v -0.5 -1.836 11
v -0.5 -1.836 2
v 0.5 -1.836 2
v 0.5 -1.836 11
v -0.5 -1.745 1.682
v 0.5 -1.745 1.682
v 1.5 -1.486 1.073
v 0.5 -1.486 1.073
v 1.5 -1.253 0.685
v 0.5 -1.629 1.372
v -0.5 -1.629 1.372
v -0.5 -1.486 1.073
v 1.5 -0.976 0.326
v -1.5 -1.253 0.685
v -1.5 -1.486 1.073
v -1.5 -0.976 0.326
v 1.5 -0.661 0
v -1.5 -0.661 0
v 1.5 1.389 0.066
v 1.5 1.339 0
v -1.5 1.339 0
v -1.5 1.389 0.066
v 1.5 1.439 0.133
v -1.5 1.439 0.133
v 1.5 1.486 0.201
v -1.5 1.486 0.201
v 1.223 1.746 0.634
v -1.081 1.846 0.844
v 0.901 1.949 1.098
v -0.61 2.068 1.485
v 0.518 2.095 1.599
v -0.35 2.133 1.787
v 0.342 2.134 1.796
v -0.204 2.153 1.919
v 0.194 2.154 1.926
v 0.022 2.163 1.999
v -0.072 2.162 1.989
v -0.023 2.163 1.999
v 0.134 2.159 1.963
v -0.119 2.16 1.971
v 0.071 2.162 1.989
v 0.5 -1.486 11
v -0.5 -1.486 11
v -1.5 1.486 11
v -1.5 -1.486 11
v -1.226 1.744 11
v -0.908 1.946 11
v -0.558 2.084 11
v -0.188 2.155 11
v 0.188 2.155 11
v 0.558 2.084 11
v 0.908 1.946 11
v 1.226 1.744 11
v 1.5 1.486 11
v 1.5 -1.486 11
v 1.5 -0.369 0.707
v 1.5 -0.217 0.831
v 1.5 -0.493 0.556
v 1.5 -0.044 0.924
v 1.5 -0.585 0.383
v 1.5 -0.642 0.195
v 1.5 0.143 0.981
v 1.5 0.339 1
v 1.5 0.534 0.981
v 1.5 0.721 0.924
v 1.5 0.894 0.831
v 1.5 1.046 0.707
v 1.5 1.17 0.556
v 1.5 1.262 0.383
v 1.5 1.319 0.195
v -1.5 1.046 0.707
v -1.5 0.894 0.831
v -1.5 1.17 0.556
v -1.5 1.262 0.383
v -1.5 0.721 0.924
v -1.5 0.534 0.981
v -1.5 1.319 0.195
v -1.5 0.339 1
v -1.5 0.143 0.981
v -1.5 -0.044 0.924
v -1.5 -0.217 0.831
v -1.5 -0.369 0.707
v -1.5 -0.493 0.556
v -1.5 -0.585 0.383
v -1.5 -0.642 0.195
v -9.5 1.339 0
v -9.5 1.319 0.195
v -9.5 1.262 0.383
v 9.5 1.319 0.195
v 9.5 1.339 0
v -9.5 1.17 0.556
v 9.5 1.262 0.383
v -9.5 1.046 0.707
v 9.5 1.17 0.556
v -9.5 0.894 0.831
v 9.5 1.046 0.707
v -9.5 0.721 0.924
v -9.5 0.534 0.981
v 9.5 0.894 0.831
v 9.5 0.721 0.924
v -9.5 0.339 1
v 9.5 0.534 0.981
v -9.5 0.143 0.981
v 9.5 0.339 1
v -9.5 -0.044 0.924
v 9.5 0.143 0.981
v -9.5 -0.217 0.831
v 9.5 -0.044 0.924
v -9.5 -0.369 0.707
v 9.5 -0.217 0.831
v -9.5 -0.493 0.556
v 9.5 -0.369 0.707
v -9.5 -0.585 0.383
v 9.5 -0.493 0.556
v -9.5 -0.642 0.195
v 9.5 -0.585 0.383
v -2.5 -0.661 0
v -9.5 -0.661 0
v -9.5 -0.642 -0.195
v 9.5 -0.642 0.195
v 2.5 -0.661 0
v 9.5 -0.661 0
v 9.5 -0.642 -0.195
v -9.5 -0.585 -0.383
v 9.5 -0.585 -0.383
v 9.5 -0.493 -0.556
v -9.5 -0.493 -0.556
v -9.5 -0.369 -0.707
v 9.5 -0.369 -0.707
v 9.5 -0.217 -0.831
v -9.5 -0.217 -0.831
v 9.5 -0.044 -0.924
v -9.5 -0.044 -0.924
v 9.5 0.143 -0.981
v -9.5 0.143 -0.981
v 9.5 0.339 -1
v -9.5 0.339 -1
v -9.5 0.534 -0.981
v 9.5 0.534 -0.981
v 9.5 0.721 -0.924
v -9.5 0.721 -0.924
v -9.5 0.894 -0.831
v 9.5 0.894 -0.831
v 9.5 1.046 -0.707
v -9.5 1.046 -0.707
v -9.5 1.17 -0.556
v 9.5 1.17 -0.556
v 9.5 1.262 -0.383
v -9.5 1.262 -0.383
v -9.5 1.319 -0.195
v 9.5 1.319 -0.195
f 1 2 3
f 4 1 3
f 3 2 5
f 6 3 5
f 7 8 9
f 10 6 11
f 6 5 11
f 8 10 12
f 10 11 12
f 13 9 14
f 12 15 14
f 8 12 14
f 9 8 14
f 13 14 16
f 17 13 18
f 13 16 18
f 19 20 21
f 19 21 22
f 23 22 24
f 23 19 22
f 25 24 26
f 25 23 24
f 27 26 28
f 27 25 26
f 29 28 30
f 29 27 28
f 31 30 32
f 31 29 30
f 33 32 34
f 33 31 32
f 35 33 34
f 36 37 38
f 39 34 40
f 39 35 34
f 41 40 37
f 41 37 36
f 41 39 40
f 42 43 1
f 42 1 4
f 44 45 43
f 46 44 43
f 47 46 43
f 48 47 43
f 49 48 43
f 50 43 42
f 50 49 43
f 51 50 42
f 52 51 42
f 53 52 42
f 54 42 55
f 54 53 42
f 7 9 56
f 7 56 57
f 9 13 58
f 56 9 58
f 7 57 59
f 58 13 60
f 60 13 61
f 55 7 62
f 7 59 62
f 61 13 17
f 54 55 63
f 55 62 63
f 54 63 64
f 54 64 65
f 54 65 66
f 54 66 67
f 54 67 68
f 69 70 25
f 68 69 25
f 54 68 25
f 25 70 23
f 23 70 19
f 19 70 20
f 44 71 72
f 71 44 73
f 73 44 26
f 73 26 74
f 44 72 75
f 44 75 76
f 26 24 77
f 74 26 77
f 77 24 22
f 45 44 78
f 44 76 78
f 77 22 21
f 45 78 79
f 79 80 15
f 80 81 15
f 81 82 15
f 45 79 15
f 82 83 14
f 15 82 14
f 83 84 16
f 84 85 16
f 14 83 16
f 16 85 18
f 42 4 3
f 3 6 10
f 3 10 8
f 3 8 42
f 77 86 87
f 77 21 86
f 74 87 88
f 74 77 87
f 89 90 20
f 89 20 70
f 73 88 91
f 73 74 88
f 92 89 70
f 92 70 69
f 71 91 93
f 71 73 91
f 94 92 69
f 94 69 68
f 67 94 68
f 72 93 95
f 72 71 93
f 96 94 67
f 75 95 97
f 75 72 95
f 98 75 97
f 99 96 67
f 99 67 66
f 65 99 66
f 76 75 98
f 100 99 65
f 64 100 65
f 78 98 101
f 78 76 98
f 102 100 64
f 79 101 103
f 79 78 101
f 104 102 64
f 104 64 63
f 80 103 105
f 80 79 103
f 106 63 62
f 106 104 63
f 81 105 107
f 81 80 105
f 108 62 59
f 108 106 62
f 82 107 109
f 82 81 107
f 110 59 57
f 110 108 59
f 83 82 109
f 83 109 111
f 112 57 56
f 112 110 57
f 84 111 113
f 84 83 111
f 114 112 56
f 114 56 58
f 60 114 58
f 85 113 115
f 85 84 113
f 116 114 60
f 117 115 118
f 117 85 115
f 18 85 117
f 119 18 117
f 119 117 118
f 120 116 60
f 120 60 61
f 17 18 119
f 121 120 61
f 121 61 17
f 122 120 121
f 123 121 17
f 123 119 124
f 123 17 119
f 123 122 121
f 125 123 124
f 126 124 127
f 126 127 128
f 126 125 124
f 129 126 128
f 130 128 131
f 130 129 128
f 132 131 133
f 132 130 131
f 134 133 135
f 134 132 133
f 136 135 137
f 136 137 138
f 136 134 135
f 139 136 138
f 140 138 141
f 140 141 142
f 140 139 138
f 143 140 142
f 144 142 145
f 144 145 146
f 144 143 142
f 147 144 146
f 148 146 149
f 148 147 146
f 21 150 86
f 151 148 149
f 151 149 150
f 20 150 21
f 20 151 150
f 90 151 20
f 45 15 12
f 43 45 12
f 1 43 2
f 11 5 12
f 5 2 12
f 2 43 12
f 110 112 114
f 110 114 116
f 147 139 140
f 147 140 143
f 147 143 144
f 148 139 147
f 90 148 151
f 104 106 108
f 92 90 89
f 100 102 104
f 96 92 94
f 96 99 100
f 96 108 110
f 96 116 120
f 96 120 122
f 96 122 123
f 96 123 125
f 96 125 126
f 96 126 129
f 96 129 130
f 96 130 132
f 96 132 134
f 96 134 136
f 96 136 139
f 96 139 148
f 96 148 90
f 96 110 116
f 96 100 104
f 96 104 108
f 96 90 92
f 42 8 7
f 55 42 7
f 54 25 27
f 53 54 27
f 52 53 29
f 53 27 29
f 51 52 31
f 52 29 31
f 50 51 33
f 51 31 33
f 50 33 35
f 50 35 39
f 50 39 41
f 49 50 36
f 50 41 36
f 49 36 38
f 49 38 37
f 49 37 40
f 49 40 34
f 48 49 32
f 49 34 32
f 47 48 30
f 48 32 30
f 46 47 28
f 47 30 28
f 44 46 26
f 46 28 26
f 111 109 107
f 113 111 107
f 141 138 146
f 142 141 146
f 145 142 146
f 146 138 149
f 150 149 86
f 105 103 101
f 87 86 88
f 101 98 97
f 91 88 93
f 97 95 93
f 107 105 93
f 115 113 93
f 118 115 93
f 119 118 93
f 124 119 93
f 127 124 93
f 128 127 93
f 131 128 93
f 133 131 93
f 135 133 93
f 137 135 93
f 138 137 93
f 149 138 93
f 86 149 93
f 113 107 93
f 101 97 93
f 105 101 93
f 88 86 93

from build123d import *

# Parameters (mm, degrees)
PAD_DEPTH    = 11
SKETCH001_R  = 1
PAD001_DEPTH = 9.5
POCKET_DEPTH = 2.5


with BuildPart() as part:
    # Sketch → Pad (new body)
    with BuildSketch(Plane.XY):
        with BuildLine():
            Line((-1.5, 1.486438), (-1.5, -1.486438))
            Line((-1.5, -1.486438), (-0.5, -1.486438))
            Line((-0.5, -1.486438), (-0.5, -1.836438))
            Line((-0.5, -1.836438), (0.5, -1.836438))
            Line((0.5, -1.836438), (0.5, -1.486438))
            Line((0.5, -1.486438), (1.5, -1.486438))
            Line((1.5, -1.486438), (1.5, 1.486438))
            ThreePointArc((1.5, 1.486438), (0, 2.163562), (-1.5, 1.486438))
        make_face()
    extrude(amount=PAD_DEPTH)

    # Sketch001 → Pad001 (join, symmetric)
    with BuildSketch(Plane.YZ):
        with Locations((0.338562, 0)):
            Circle(SKETCH001_R)
    extrude(amount=PAD001_DEPTH, both=True)

    # Sketch002 → Pocket (cut, symmetric)
    with BuildSketch(Plane.YZ):
        with BuildLine():
            ThreePointArc((-1.836438, 2), (-1.397096, 0.912957), (-0.661438, 0))
            Line((-3.011438, 0), (-0.661438, 0))
            Line((-3.011438, 2), (-3.011438, 0))
            Line((-1.836438, 2), (-3.011438, 2))
        make_face()
        with BuildLine():
            ThreePointArc((1.338562, 0), (1.888846, 0.943164), (2.163562, 2))
            Line((2.163562, 2), (3.338562, 2))
            Line((3.338562, 2), (3.338562, 0))
            Line((3.338562, 0), (1.338562, 0))
        make_face()
    extrude(amount=POCKET_DEPTH, both=True, mode=Mode.SUBTRACT)


solid = part.part
